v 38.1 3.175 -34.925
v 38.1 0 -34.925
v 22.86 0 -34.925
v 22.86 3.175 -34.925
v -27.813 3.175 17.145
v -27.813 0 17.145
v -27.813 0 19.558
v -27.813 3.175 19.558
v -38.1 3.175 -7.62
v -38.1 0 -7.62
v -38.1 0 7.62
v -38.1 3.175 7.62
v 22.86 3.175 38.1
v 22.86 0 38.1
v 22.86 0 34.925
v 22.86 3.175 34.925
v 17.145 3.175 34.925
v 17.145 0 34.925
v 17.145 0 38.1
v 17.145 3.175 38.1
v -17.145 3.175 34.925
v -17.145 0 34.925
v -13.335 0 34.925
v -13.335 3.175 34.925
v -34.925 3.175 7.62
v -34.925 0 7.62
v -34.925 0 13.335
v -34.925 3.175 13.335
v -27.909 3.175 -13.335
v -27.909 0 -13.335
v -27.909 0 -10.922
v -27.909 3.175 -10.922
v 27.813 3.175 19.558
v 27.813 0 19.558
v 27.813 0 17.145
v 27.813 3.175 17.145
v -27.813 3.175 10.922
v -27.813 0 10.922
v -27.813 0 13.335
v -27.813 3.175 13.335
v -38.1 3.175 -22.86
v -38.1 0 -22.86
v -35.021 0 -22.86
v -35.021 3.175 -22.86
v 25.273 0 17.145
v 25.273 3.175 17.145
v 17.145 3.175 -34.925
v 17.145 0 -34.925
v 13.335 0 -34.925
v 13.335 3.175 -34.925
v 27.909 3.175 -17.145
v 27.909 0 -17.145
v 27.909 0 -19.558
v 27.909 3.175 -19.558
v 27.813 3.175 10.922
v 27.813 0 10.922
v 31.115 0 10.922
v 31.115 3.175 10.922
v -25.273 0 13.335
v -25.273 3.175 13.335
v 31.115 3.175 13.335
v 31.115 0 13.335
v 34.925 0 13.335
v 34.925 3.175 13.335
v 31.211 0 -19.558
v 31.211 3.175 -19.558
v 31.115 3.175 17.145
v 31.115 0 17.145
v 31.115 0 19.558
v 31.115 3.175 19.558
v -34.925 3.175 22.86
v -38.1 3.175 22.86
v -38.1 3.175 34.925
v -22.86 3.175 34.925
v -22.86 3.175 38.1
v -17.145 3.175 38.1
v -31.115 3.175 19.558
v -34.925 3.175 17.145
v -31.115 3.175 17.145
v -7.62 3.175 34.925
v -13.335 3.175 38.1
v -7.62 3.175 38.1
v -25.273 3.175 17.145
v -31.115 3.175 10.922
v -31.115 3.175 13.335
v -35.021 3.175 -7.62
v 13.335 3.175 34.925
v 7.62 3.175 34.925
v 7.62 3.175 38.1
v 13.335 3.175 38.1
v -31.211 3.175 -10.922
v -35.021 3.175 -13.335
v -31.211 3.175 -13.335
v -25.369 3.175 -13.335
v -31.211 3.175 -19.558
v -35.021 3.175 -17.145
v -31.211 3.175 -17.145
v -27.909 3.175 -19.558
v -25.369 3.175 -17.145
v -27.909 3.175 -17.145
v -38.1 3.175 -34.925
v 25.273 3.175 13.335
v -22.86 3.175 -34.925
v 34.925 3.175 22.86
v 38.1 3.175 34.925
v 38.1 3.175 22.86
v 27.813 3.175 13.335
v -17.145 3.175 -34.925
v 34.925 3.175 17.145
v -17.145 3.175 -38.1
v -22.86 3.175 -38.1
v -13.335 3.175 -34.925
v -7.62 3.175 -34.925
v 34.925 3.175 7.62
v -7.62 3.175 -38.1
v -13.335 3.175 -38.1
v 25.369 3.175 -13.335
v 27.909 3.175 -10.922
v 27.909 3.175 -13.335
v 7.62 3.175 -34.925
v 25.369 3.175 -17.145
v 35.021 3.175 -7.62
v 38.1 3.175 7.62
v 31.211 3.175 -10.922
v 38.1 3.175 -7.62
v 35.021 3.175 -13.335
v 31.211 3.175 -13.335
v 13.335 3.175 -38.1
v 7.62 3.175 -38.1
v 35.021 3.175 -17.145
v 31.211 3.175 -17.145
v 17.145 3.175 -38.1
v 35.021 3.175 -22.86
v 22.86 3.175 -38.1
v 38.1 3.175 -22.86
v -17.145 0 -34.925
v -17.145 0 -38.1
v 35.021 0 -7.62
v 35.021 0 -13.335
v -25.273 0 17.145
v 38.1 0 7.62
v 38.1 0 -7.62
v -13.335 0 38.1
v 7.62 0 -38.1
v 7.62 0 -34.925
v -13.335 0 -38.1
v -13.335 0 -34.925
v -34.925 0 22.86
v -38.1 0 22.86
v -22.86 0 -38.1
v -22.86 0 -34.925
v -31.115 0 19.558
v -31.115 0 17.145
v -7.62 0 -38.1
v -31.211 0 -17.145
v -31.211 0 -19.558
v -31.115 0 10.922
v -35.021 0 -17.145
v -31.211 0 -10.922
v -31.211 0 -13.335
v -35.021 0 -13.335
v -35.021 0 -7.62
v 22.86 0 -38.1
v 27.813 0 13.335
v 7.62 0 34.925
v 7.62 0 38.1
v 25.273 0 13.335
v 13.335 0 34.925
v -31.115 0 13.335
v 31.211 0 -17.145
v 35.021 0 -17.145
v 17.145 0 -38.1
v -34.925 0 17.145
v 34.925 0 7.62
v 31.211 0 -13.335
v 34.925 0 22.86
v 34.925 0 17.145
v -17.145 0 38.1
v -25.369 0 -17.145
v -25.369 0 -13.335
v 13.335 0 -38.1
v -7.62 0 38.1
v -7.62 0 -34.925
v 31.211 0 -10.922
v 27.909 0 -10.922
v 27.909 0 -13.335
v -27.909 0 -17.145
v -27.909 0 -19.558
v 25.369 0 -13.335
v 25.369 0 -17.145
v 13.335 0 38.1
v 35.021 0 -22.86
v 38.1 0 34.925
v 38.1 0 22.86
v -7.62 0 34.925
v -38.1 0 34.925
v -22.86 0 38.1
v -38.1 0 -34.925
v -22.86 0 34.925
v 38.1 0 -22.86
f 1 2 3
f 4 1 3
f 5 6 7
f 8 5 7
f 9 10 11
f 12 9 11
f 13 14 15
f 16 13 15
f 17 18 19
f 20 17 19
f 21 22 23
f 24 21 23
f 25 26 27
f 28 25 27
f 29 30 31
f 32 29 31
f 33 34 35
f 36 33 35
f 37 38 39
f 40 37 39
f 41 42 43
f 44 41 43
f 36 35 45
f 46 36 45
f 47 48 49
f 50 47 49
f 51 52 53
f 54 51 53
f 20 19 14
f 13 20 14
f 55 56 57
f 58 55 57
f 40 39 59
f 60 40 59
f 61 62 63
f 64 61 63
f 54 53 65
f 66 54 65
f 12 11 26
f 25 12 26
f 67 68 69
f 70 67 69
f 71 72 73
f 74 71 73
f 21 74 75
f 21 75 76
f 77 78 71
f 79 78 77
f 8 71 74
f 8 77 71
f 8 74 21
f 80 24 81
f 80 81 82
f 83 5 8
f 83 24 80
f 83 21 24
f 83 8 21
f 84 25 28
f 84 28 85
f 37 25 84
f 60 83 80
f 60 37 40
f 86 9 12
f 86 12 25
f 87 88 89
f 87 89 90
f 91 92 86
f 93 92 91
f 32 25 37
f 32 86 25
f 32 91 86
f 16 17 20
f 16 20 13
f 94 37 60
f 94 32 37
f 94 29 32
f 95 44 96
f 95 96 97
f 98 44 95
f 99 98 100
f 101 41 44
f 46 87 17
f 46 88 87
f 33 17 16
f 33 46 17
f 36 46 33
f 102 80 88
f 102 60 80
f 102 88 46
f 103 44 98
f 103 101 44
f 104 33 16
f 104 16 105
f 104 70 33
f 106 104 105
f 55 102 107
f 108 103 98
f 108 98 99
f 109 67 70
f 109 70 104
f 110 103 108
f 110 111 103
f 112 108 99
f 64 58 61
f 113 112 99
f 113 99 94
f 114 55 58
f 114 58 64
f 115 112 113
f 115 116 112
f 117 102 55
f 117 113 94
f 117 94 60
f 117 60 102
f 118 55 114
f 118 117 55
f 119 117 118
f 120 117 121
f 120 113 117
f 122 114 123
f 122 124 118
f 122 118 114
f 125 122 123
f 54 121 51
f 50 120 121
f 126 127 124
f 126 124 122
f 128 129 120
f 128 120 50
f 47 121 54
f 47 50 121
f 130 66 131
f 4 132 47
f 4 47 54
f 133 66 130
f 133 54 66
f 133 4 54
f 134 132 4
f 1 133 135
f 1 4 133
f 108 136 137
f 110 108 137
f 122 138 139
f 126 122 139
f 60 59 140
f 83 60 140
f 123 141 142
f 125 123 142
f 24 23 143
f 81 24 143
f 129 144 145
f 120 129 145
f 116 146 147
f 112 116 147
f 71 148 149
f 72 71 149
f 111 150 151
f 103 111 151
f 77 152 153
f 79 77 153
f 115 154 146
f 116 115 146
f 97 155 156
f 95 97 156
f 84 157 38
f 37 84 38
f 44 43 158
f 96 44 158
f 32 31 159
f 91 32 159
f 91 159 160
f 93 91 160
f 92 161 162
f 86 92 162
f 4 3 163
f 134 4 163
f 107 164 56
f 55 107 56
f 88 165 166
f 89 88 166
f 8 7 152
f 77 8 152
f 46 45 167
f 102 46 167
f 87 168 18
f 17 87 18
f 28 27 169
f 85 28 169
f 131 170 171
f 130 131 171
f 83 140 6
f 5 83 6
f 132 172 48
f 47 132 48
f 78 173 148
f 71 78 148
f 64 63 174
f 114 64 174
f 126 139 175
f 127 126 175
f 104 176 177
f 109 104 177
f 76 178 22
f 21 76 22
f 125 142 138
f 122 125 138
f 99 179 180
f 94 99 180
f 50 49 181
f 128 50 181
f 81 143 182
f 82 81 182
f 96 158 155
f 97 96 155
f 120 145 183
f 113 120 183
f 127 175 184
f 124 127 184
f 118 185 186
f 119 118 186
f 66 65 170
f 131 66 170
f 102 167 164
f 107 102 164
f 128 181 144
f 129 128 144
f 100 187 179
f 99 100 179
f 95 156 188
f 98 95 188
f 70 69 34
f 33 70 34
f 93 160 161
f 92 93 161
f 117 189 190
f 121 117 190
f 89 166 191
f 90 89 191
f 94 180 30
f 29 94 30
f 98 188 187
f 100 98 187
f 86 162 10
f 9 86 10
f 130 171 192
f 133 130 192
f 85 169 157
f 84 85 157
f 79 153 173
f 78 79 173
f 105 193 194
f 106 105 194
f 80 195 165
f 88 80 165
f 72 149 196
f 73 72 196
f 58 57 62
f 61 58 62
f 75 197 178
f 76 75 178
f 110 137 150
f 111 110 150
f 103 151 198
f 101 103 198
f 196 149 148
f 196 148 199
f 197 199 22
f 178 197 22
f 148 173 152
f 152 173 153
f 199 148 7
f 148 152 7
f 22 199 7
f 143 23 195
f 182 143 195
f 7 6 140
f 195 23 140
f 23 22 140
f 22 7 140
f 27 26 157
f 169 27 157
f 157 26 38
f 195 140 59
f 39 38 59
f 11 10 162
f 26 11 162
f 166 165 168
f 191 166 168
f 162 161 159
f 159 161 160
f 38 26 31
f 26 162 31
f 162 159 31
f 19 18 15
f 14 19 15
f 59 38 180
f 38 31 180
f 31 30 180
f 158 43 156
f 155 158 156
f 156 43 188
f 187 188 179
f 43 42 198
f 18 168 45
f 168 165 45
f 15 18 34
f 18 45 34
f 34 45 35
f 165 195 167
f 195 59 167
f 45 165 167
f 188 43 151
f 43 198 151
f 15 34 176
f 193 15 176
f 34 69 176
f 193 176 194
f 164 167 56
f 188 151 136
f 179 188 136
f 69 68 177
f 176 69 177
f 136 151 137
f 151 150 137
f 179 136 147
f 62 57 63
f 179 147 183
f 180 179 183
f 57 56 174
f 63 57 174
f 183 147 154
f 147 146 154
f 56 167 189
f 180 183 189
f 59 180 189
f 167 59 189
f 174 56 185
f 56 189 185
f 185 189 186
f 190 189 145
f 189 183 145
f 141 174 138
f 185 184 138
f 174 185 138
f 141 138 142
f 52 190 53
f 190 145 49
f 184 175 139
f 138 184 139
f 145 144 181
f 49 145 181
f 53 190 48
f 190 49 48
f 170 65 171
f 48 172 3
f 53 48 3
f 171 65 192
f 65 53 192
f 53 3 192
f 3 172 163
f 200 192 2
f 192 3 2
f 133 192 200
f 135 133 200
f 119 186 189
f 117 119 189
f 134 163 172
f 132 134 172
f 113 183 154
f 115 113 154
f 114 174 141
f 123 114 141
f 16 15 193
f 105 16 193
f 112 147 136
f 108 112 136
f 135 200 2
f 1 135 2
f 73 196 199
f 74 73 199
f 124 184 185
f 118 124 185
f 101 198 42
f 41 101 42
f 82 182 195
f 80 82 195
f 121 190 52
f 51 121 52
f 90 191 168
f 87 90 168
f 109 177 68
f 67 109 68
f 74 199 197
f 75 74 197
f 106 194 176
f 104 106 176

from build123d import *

# Parameters (mm, degrees)
BOSS_EXTRUDE1_DEPTH = 3.175


with BuildPart() as part:
    # Sketch1 → Boss-Extrude1 (new body)
    with BuildSketch(Plane(origin=(0, 0, 0), x_dir=(1, 0, 0), z_dir=(0, 1, 0))):
        Polygon((-27.813, -13.335), (-25.273, -13.335), (-25.273, -17.145), (-27.813, -17.145), (-27.813, -19.558), (-31.115, -19.558), (-31.115, -17.145), (-34.925, -17.145), (-34.925, -22.86), (-38.1, -22.86), (-38.1, -34.925), (-34.925, -34.925), (-22.86, -34.925), (-22.86, -38.1), (-17.145, -38.1), (-17.145, -34.925), (-13.335, -34.925), (-13.335, -38.1), (-7.62, -38.1), (-7.62, -34.925), (7.62, -34.925), (7.62, -38.1), (13.335, -38.1), (13.335, -34.925), (17.145, -34.925), (17.145, -38.1), (22.86, -38.1), (22.86, -34.925), (34.925, -34.925), (38.1, -34.925), (38.1, -22.86), (34.925, -22.86), (34.925, -17.145), (31.115, -17.145), (31.115, -19.558), (27.813, -19.558), (27.813, -17.145), (25.273, -17.145), (25.273, -13.335), (27.813, -13.335), (27.813, -10.922), (31.115, -10.922), (31.115, -13.335), (34.925, -13.335), (34.925, -7.62), (38.1, -7.62), (38.1, 7.62), (35.021495431, 7.62), (35.021495431, 13.335), (31.211495431, 13.335), (31.211495431, 10.922), (27.909495431, 10.922), (27.909495431, 13.335), (25.369495431, 13.335), (25.369495431, 17.145), (27.909495431, 17.145), (27.909495431, 19.558), (31.211495431, 19.558), (31.211495431, 17.145), (35.021495431, 17.145), (35.021495431, 22.86), (38.1, 22.86), (38.1, 34.925), (34.925, 34.925), (22.86, 34.925), (22.86, 38.1), (17.145, 38.1), (17.145, 34.925), (13.335, 34.925), (13.335, 38.1), (7.62, 38.1), (7.62, 34.925), (-7.62, 34.925), (-7.62, 38.1), (-13.335, 38.1), (-13.335, 34.925), (-17.145, 34.925), (-17.145, 38.1), (-22.86, 38.1), (-22.86, 34.925), (-34.925, 34.925), (-38.1, 34.925), (-38.1, 22.86), (-35.021495431, 22.86), (-35.021495431, 17.145), (-31.211495431, 17.145), (-31.211495431, 19.558), (-27.909495431, 19.558), (-27.909495431, 17.145), (-25.369495431, 17.145), (-25.369495431, 13.335), (-27.909495431, 13.335), (-27.909495431, 10.922), (-31.211495431, 10.922), (-31.211495431, 13.335), (-35.021495431, 13.335), (-35.021495431, 7.62), (-38.1, 7.62), (-38.1, -7.62), (-34.925, -7.62), (-34.925, -13.335), (-31.115, -13.335), (-31.115, -10.922), (-27.813, -10.922), align=None)
    extrude(amount=BOSS_EXTRUDE1_DEPTH)


solid = part.part
